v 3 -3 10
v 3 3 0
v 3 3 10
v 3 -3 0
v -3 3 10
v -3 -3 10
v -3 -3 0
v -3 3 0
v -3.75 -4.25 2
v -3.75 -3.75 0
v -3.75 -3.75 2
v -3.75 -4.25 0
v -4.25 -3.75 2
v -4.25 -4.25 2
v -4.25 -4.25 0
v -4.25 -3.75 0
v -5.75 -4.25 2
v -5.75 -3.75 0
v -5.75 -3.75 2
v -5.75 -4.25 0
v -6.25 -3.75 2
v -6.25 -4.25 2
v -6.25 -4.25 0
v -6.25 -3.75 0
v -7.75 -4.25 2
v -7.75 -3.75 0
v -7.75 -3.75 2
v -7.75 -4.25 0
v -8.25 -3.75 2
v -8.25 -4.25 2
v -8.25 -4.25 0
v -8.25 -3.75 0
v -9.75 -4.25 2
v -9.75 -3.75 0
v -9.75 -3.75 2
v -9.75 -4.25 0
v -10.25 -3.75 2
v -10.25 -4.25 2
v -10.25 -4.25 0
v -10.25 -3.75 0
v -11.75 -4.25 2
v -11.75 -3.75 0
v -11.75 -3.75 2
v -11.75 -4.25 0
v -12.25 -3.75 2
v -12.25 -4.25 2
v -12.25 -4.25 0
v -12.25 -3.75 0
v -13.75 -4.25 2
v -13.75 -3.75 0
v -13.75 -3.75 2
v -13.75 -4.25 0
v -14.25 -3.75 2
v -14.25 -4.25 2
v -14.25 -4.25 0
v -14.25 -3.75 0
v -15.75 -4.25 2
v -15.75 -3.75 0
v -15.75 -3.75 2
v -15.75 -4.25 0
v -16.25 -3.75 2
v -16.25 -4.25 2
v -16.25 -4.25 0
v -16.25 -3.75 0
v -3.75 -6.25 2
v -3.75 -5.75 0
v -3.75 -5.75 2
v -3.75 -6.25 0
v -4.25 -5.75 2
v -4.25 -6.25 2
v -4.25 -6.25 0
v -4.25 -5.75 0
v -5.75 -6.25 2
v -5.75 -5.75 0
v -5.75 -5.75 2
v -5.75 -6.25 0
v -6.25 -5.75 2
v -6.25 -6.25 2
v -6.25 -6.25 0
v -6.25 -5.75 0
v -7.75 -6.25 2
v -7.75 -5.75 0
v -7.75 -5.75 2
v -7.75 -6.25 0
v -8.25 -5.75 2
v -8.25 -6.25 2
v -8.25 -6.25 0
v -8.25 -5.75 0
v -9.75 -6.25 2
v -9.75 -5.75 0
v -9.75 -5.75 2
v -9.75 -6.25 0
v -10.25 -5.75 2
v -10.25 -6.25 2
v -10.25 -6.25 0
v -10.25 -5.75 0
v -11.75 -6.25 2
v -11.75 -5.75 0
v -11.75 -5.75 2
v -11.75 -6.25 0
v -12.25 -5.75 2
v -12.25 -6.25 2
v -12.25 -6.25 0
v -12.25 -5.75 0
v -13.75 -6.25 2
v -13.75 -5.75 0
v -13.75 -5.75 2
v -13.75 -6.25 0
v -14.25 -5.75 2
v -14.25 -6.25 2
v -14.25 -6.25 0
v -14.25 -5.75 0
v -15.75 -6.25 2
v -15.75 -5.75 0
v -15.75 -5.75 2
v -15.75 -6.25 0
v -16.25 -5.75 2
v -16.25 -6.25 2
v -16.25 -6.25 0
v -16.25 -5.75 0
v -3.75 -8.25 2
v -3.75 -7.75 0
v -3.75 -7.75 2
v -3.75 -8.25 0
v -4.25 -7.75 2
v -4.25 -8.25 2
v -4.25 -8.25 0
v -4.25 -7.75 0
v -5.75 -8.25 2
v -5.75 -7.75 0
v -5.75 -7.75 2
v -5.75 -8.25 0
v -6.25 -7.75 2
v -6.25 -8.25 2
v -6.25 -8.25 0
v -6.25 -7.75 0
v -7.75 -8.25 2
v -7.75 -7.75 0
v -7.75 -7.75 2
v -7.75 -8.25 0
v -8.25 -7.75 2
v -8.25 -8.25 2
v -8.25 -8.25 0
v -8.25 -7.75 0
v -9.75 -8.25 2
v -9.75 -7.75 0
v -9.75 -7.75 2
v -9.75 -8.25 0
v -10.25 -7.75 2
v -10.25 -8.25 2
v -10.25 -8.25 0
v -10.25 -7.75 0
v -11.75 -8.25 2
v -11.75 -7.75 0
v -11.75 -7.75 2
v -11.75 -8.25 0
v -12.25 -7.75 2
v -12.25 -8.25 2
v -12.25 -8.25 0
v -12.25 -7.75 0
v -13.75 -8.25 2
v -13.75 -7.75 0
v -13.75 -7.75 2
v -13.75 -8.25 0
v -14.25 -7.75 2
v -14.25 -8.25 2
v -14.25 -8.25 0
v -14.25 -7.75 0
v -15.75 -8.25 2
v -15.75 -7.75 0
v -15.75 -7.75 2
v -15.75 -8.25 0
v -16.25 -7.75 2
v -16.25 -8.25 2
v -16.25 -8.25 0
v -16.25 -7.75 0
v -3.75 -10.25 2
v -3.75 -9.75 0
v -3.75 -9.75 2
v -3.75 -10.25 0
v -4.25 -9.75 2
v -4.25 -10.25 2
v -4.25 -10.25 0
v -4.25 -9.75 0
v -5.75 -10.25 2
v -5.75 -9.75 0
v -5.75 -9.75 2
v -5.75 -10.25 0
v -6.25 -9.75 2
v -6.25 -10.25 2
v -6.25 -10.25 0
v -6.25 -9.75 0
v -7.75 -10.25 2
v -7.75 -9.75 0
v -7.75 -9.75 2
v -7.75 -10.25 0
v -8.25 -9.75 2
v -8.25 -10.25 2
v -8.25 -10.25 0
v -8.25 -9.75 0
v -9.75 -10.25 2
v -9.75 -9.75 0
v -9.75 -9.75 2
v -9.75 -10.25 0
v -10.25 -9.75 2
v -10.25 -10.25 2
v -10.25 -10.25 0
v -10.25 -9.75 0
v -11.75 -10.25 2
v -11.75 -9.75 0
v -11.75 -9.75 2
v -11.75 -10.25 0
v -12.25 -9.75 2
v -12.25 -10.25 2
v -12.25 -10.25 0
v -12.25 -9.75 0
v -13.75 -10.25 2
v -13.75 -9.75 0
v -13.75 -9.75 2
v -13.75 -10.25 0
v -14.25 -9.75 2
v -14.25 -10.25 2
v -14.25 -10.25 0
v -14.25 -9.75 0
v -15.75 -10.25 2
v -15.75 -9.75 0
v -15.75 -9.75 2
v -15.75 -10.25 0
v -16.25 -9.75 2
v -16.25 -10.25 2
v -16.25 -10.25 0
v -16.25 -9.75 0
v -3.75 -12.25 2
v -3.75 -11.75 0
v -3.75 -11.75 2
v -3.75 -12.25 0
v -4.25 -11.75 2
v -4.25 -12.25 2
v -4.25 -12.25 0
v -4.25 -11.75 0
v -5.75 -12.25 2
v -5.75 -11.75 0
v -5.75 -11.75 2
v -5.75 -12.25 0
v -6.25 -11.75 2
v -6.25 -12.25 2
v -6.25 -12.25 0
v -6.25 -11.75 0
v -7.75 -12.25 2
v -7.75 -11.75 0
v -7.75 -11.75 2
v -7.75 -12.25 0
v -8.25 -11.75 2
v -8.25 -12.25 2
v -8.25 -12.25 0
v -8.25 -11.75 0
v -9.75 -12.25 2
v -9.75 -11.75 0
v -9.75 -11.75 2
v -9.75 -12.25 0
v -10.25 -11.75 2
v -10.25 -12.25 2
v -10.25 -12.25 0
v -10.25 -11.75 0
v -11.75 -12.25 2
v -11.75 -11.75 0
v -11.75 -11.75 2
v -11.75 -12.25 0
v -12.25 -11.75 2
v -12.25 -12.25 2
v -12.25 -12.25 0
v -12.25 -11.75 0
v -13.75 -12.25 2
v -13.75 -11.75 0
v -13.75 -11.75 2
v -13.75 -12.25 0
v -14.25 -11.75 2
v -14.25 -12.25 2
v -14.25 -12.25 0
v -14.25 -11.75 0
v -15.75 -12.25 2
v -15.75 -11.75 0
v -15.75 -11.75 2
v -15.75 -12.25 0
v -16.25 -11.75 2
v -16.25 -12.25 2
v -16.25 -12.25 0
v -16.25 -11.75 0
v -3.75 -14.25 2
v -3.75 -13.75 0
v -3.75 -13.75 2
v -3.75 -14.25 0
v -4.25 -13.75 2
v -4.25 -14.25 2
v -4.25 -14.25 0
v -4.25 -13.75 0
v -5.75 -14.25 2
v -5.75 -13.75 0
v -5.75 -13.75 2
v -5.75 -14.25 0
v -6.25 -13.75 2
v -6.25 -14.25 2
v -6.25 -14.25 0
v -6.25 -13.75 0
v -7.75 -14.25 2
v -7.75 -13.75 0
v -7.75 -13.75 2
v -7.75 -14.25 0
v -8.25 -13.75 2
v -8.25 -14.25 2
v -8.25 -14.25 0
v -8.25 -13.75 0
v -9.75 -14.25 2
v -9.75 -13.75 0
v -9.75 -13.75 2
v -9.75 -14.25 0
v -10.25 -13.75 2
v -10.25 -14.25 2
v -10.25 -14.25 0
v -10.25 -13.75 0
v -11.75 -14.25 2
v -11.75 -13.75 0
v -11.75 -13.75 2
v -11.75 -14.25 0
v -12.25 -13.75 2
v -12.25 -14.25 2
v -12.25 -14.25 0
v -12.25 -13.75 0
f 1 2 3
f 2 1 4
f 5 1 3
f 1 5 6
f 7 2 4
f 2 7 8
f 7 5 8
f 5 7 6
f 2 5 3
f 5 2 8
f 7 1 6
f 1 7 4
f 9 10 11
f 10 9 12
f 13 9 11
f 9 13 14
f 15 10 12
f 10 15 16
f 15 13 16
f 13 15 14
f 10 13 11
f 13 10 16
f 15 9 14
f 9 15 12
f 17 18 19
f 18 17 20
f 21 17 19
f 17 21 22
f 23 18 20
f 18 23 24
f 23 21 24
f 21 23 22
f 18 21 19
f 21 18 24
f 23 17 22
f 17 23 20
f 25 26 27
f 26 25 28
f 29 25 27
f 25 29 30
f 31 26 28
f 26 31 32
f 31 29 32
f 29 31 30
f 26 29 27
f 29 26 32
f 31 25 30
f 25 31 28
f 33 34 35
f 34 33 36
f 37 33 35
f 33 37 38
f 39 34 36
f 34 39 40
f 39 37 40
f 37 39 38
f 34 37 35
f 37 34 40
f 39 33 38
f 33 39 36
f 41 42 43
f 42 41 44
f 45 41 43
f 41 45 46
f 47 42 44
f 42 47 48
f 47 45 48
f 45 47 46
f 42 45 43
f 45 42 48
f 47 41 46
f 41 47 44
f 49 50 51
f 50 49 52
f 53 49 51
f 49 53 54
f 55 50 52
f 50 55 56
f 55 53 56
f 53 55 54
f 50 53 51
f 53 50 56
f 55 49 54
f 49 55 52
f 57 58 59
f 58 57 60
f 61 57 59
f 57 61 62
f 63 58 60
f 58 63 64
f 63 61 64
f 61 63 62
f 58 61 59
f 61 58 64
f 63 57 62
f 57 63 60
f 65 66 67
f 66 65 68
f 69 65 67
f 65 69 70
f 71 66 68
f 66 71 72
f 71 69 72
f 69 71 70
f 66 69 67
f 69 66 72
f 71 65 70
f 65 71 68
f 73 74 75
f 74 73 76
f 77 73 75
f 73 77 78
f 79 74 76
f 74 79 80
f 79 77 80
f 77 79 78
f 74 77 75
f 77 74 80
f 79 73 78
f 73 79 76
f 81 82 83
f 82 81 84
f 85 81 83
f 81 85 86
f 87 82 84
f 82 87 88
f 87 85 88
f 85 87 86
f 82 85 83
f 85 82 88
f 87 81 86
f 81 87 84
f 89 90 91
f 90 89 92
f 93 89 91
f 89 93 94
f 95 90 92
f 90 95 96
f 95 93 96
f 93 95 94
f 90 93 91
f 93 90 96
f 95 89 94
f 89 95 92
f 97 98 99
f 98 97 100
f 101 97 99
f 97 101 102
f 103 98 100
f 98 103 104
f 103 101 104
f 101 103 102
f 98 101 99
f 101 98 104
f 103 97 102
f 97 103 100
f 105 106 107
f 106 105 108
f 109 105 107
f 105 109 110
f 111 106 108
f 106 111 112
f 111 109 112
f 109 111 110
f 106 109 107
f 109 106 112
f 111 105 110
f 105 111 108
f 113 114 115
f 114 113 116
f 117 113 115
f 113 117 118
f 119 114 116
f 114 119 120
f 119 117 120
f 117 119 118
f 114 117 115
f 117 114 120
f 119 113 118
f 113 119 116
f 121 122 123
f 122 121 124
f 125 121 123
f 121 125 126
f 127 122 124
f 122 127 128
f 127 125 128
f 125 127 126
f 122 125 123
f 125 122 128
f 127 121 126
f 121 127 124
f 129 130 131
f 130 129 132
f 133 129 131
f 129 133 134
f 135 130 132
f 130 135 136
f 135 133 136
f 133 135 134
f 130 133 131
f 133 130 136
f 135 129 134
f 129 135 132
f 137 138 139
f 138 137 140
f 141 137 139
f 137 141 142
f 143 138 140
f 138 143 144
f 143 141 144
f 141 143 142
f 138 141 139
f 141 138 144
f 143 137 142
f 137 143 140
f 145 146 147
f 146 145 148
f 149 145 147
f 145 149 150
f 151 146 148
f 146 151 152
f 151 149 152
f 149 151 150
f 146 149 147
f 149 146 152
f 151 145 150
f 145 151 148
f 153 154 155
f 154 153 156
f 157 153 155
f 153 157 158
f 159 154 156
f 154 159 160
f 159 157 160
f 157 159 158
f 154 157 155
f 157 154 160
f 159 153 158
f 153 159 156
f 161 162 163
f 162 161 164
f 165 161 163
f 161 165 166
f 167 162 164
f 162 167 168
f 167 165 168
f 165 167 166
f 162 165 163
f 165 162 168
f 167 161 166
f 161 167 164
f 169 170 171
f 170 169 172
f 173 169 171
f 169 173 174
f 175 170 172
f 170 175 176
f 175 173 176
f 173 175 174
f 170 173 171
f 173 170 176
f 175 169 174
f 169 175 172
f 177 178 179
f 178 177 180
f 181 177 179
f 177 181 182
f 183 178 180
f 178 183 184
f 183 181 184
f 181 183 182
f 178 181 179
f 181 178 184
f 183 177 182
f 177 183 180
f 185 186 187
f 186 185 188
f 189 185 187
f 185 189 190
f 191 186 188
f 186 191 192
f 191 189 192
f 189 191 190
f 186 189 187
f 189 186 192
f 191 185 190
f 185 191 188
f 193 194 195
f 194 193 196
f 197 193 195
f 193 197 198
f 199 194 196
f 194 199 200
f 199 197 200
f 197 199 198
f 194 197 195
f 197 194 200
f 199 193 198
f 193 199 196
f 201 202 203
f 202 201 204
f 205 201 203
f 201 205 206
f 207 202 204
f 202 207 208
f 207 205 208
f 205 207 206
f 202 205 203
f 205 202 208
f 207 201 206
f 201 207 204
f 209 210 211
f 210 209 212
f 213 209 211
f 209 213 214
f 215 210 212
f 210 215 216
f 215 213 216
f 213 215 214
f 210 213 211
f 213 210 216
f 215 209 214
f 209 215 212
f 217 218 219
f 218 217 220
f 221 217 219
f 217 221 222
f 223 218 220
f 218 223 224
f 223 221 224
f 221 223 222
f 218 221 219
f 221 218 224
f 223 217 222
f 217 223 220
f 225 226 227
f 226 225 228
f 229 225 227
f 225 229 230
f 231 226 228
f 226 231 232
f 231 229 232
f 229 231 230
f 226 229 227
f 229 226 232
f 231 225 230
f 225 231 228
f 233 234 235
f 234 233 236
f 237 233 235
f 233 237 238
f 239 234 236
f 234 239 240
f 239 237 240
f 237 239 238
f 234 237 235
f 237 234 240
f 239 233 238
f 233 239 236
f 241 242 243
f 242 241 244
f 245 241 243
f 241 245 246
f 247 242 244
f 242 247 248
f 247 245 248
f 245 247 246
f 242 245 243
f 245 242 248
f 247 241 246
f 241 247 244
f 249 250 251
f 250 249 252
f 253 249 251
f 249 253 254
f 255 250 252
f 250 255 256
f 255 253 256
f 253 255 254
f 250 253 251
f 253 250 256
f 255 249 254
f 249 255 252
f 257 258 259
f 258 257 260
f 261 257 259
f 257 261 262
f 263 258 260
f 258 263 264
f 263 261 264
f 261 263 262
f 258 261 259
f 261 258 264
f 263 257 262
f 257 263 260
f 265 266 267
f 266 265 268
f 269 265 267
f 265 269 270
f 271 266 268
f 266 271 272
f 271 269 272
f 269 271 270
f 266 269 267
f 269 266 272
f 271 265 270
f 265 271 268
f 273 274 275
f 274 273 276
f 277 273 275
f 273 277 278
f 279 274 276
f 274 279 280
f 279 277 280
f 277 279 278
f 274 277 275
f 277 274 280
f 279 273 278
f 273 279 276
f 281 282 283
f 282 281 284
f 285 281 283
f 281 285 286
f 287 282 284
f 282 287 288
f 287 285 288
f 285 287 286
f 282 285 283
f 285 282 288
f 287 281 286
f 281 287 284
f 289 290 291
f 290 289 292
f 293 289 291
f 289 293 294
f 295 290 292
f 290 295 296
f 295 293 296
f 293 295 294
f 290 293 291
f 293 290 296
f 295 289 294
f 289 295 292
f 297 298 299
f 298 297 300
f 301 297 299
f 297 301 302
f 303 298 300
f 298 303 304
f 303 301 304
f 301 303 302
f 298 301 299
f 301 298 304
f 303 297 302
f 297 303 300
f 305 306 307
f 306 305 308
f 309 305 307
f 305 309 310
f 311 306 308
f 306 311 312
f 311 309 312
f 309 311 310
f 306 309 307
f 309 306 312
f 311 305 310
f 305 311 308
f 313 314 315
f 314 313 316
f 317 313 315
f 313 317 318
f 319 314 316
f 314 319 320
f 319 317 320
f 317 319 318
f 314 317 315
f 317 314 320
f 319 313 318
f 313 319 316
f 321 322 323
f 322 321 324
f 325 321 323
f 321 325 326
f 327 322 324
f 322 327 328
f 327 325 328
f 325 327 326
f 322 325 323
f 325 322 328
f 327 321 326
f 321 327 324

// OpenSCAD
translate([0, 0, 5]) color([0,1,0,0.9]) cube([6, 6, 10], center=true);
translate([-4, -4, 1]) color([1,0,0]) cube([0.5, 0.5, 2], center=true);
translate([-6, -4, 1]) color([1,0,0]) cube([0.5, 0.5, 2], center=true);
translate([-8, -4, 1]) color([1,0,0]) cube([0.5, 0.5, 2], center=true);
translate([-10, -4, 1]) color([1,0,0]) cube([0.5, 0.5, 2], center=true);
translate([-12, -4, 1]) color([1,0,0]) cube([0.5, 0.5, 2], center=true);
translate([-14, -4, 1]) color([1,0,0]) cube([0.5, 0.5, 2], center=true);
translate([-16, -4, 1]) color([1,0,0]) cube([0.5, 0.5, 2], center=true);
translate([-4, -6, 1]) color([1,0,0]) cube([0.5, 0.5, 2], center=true);
translate([-6, -6, 1]) color([1,0,0]) cube([0.5, 0.5, 2], center=true);
translate([-8, -6, 1]) color([1,0,0]) cube([0.5, 0.5, 2], center=true);
translate([-10, -6, 1]) color([1,0,0]) cube([0.5, 0.5, 2], center=true);
translate([-12, -6, 1]) color([1,0,0]) cube([0.5, 0.5, 2], center=true);
translate([-14, -6, 1]) color([1,0,0]) cube([0.5, 0.5, 2], center=true);
translate([-16, -6, 1]) color([1,0,0]) cube([0.5, 0.5, 2], center=true);
translate([-4, -8, 1]) color([1,0,0]) cube([0.5, 0.5, 2], center=true);
translate([-6, -8, 1]) color([1,0,0]) cube([0.5, 0.5, 2], center=true);
translate([-8, -8, 1]) color([1,0,0]) cube([0.5, 0.5, 2], center=true);
translate([-10, -8, 1]) color([1,0,0]) cube([0.5, 0.5, 2], center=true);
translate([-12, -8, 1]) color([1,0,0]) cube([0.5, 0.5, 2], center=true);
translate([-14, -8, 1]) color([1,0,0]) cube([0.5, 0.5, 2], center=true);
translate([-16, -8, 1]) color([1,0,0]) cube([0.5, 0.5, 2], center=true);
translate([-4, -10, 1]) color([1,0,0]) cube([0.5, 0.5, 2], center=true);
translate([-6, -10, 1]) color([1,0,0]) cube([0.5, 0.5, 2], center=true);
translate([-8, -10, 1]) color([1,0,0]) cube([0.5, 0.5, 2], center=true);
translate([-10, -10, 1]) color([1,0,0]) cube([0.5, 0.5, 2], center=true);
translate([-12, -10, 1]) color([1,0,0]) cube([0.5, 0.5, 2], center=true);
translate([-14, -10, 1]) color([1,0,0]) cube([0.5, 0.5, 2], center=true);
translate([-16, -10, 1]) color([1,0,0]) cube([0.5, 0.5, 2], center=true);
translate([-4, -12, 1]) color([1,0,0]) cube([0.5, 0.5, 2], center=true);
translate([-6, -12, 1]) color([1,0,0]) cube([0.5, 0.5, 2], center=true);
translate([-8, -12, 1]) color([1,0,0]) cube([0.5, 0.5, 2], center=true);
translate([-10, -12, 1]) color([1,0,0]) cube([0.5, 0.5, 2], center=true);
translate([-12, -12, 1]) color([1,0,0]) cube([0.5, 0.5, 2], center=true);
translate([-14, -12, 1]) color([1,0,0]) cube([0.5, 0.5, 2], center=true);
translate([-16, -12, 1]) color([1,0,0]) cube([0.5, 0.5, 2], center=true);
translate([-4, -14, 1]) color([1,0,0]) cube([0.5, 0.5, 2], center=true);
translate([-6, -14, 1]) color([1,0,0]) cube([0.5, 0.5, 2], center=true);
translate([-8, -14, 1]) color([1,0,0]) cube([0.5, 0.5, 2], center=true);
translate([-10, -14, 1]) color([1,0,0]) cube([0.5, 0.5, 2], center=true);
translate([-12, -14, 1]) color([1,0,0]) cube([0.5, 0.5, 2], center=true);
